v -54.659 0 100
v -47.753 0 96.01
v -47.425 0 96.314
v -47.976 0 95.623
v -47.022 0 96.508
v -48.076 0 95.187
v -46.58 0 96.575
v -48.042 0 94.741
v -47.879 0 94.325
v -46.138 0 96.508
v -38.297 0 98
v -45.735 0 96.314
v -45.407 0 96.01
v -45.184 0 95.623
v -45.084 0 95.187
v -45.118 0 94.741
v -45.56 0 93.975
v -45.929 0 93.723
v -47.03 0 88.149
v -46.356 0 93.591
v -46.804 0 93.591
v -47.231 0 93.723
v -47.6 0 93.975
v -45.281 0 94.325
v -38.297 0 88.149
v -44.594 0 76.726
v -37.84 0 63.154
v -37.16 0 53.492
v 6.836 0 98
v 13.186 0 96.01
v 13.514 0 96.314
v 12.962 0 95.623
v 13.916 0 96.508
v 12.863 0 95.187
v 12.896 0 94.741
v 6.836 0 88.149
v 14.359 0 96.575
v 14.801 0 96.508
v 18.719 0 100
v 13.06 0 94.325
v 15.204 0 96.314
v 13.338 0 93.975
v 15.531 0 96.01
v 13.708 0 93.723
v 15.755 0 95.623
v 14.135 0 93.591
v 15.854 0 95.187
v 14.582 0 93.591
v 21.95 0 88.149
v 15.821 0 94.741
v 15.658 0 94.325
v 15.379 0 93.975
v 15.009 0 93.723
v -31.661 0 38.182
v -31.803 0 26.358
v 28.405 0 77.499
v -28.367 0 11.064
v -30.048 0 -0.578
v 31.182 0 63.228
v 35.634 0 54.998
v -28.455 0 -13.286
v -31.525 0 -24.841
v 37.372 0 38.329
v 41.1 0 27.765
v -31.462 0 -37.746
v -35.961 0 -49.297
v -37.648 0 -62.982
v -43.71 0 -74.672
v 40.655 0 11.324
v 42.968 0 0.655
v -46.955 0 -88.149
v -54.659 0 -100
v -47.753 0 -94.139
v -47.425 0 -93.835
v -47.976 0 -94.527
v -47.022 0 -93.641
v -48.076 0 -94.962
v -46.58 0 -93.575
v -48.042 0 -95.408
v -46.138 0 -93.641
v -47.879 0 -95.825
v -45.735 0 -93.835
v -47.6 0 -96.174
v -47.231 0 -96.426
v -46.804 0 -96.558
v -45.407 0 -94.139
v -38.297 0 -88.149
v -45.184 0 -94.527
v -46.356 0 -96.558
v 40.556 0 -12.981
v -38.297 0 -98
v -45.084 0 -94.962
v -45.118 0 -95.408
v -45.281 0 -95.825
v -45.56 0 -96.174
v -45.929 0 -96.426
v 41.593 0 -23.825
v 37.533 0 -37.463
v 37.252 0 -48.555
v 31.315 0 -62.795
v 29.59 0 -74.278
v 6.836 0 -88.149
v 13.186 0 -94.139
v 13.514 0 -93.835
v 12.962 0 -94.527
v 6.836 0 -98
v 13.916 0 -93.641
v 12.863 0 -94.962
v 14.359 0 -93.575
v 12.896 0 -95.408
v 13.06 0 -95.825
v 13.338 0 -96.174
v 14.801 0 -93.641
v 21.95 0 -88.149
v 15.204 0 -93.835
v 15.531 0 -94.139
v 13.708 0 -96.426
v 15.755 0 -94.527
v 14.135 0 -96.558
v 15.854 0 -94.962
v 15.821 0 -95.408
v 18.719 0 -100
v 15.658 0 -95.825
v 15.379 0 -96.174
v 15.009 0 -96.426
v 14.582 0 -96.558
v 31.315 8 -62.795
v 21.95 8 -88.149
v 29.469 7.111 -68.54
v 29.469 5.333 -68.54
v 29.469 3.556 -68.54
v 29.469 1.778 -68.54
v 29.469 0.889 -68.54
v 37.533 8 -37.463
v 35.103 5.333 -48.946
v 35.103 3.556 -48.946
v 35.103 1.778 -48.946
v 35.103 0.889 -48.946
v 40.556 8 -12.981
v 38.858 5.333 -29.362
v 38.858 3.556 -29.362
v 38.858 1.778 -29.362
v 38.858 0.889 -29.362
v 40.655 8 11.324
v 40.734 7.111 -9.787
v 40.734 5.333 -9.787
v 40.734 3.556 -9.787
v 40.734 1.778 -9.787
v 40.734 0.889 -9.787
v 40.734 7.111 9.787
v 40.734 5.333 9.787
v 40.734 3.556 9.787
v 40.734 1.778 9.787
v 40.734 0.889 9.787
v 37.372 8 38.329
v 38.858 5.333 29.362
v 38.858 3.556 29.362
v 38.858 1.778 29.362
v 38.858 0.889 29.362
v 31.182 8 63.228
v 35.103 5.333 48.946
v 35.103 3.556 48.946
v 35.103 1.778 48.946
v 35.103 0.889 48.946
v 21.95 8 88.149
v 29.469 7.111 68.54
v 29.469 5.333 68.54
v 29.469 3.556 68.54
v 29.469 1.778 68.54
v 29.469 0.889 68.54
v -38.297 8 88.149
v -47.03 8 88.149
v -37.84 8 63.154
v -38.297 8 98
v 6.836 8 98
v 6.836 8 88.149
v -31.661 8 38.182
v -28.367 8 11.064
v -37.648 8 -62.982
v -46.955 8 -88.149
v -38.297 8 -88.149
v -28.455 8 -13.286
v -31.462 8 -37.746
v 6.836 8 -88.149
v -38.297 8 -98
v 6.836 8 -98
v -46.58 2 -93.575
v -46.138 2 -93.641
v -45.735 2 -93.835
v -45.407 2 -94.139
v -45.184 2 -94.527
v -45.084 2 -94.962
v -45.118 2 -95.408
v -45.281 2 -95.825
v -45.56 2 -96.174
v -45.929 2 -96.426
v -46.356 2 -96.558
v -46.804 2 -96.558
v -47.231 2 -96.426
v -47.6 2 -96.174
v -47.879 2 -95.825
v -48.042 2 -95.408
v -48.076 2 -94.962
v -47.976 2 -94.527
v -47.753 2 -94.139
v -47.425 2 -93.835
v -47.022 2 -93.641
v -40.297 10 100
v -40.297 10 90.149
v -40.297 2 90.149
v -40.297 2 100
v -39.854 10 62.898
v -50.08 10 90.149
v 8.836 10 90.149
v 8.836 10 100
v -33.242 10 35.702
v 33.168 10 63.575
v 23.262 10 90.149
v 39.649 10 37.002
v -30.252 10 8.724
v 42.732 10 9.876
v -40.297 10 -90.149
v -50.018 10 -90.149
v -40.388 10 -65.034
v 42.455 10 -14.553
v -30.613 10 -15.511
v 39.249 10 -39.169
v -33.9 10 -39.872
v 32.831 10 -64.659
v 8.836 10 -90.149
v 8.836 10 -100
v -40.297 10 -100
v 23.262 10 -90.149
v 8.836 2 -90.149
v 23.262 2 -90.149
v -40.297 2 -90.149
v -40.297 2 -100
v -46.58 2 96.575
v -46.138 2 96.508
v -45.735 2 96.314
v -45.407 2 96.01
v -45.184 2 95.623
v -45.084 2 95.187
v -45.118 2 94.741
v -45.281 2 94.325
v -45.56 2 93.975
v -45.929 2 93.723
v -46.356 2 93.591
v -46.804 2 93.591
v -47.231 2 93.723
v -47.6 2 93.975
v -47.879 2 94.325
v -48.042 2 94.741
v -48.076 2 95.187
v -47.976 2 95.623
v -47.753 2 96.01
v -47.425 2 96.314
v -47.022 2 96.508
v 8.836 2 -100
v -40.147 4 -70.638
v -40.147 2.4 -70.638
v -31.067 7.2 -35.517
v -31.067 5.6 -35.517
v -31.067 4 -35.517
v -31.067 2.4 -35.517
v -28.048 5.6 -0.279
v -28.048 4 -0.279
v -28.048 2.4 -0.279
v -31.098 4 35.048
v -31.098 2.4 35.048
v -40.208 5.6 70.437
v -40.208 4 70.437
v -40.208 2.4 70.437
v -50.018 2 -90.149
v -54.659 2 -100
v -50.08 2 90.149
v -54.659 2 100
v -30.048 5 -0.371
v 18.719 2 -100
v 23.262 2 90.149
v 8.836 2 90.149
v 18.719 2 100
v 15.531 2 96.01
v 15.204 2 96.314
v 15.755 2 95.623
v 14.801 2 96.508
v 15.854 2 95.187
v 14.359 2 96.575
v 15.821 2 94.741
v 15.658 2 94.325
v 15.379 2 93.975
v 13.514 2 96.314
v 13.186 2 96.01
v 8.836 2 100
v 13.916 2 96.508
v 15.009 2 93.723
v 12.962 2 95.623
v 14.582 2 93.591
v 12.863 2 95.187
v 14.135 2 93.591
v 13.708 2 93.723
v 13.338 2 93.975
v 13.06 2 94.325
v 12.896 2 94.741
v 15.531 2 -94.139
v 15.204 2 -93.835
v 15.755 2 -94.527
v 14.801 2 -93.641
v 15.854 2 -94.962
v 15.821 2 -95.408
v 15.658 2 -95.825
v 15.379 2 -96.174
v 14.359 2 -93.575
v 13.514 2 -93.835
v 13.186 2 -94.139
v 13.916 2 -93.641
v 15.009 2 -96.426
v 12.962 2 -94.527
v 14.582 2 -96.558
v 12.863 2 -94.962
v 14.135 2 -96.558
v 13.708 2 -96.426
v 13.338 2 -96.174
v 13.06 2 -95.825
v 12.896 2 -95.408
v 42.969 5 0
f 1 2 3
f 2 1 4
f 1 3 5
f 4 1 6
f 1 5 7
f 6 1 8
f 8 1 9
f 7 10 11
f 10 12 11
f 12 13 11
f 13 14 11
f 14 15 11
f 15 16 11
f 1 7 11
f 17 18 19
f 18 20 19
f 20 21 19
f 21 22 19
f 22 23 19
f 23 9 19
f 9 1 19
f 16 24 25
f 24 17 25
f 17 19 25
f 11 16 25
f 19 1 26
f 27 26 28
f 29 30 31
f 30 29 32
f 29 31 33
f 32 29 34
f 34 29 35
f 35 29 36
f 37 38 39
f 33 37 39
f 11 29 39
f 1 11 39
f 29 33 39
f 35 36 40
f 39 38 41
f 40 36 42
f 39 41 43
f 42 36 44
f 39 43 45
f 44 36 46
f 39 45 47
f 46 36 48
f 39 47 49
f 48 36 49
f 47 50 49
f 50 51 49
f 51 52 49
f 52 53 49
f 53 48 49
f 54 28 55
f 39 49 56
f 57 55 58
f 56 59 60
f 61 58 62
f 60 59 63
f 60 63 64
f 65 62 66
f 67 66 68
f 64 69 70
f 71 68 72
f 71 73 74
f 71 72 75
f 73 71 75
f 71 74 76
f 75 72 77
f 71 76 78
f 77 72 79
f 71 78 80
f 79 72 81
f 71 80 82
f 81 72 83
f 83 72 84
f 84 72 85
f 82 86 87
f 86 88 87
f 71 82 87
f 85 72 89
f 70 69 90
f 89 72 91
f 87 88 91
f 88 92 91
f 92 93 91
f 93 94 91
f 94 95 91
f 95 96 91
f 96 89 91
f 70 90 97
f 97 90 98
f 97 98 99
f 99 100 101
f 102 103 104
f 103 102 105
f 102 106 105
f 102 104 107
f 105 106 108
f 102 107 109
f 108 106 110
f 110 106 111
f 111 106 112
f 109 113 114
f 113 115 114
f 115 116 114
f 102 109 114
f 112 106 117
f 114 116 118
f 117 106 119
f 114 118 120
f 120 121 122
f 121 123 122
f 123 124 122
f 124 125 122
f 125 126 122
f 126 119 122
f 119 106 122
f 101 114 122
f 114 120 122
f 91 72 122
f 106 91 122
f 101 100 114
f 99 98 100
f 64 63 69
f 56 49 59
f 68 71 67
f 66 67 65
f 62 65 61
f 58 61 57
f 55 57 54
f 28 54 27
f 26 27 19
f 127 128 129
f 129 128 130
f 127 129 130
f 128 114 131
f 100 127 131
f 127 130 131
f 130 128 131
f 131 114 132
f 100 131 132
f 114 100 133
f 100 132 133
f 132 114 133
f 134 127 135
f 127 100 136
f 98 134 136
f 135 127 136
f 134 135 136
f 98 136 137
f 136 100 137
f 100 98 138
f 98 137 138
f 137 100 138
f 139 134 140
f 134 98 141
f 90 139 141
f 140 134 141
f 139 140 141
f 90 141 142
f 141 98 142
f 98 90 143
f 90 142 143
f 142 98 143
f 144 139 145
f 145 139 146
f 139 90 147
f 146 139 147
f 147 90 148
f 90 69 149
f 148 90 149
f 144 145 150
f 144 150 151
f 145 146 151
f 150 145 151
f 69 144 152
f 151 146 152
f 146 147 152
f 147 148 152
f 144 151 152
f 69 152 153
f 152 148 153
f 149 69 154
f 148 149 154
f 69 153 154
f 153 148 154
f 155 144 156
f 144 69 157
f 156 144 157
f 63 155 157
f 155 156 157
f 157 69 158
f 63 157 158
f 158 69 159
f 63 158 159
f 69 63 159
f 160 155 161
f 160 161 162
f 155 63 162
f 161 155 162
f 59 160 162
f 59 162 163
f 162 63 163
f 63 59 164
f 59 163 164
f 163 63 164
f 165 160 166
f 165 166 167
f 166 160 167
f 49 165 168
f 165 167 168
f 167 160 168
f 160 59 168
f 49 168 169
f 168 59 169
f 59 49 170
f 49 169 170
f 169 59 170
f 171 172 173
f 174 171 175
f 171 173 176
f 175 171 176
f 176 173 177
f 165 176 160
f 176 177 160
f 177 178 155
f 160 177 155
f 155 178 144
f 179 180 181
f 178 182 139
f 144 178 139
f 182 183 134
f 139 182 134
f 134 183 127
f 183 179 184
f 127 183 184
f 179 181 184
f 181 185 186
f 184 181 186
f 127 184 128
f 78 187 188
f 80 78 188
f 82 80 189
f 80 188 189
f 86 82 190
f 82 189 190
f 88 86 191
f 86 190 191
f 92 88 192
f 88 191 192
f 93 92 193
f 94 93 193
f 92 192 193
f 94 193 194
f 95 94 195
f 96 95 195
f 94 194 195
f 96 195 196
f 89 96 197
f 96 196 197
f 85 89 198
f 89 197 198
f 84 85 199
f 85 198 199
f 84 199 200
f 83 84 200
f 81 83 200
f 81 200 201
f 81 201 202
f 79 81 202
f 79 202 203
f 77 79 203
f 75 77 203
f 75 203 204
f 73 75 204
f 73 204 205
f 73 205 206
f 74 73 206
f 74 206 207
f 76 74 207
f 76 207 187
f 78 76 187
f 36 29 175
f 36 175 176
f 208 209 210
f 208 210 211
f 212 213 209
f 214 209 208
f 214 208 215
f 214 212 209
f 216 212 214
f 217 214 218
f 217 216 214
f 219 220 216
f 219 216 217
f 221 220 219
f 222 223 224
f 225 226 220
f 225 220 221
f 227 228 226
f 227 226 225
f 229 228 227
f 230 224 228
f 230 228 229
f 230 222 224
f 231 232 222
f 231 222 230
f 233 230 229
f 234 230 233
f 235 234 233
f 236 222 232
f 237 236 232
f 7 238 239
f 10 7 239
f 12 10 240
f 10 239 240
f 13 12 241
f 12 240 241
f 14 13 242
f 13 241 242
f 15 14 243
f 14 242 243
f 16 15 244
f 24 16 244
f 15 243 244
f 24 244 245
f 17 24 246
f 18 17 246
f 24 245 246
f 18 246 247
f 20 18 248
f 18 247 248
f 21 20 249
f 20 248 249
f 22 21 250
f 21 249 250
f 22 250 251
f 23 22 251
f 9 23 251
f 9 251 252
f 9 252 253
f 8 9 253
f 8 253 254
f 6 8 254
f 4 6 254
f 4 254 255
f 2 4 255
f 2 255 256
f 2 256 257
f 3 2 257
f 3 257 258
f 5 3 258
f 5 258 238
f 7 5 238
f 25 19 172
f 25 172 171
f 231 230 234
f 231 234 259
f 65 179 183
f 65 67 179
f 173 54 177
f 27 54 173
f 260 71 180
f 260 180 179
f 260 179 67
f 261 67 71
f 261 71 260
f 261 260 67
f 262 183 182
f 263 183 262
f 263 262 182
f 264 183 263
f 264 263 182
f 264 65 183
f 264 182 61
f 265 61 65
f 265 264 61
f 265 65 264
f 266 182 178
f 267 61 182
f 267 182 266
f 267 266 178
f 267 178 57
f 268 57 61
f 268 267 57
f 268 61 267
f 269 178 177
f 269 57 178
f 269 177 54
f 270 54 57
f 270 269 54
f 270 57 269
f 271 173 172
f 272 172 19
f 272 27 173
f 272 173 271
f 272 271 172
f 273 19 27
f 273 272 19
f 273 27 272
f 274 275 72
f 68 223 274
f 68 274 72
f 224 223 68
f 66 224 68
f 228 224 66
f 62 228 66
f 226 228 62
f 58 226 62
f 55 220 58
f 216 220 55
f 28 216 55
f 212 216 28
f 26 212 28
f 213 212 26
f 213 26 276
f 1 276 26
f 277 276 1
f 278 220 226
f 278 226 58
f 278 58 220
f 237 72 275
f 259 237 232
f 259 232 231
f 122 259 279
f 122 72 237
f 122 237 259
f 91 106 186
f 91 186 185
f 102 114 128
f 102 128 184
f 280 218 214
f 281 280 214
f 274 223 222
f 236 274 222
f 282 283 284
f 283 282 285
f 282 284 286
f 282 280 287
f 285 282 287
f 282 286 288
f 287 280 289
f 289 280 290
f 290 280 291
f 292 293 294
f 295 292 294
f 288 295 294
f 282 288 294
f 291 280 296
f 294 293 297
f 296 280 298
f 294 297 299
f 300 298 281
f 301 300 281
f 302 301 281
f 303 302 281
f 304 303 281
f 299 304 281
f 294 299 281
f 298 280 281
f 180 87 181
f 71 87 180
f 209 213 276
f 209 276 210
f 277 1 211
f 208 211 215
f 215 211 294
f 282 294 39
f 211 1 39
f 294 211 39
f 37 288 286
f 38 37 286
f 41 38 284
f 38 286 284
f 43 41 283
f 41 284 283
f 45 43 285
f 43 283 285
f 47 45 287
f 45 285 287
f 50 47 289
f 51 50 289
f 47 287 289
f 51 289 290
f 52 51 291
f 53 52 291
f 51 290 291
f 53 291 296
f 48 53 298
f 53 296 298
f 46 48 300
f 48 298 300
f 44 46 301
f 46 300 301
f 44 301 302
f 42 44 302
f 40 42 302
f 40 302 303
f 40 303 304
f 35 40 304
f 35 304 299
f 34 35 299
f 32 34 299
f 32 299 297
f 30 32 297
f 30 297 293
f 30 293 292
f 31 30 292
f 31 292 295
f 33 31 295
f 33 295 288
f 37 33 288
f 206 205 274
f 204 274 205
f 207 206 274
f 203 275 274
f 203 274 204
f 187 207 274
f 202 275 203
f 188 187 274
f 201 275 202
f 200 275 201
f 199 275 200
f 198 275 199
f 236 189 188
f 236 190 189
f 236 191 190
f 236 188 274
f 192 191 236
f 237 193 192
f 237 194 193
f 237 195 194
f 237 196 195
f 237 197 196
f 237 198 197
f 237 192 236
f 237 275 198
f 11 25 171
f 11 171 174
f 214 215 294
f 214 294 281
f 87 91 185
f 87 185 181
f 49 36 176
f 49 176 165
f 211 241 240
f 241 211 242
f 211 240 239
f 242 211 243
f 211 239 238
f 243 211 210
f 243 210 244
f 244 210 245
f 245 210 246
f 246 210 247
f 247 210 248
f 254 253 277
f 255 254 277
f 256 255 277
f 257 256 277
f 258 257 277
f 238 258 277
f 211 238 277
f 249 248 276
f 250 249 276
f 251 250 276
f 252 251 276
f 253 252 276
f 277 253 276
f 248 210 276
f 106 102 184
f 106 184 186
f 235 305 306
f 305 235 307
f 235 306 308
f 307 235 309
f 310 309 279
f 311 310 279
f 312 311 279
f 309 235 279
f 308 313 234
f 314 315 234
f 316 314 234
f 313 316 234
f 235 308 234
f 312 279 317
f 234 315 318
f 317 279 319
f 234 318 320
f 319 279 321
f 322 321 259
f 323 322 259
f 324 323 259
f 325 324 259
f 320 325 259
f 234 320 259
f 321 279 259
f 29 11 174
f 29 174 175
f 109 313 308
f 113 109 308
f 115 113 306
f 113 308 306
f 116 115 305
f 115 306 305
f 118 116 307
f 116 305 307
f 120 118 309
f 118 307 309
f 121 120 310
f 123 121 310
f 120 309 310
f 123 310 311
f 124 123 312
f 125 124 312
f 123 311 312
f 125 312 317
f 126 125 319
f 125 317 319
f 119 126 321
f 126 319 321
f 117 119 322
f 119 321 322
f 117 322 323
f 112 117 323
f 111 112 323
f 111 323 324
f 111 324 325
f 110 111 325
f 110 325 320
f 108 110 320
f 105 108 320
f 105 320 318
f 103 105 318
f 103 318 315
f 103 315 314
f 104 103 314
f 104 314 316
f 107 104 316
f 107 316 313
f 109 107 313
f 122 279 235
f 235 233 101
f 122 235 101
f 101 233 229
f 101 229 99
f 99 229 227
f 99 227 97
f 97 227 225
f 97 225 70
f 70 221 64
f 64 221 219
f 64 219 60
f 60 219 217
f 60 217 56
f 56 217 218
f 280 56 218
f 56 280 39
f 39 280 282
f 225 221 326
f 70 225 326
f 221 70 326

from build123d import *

# Parameters (mm, degrees)
CROQUIS1_W              = 200
CROQUIS1_H              = 200
SALIENTE_EXTRUIR1_DEPTH = 10
CORTAR_EXTRUIR2_DEPTH   = 10
CORTAR_EXTRUIR3_DEPTH   = 8
CROQUIS6_R              = 1.5
CORTAR_EXTRUIR4_DEPTH   = 32
VACIADO1_DEPTH          = 8


# Read off the part's stored shape, not the designer's step: Vaciado1
with BuildPart() as part:
    # Croquis1 → Saliente-Extruir1 (new body)
    with BuildSketch(Plane(origin=(0, 0, 0), x_dir=(1, 0, 0), z_dir=(0, 1, 0))):
        Rectangle(CROQUIS1_W, CROQUIS1_H)
    extrude(amount=SALIENTE_EXTRUIR1_DEPTH)

    # Croquis3 → Cortar-Extruir2 (cut)
    with BuildSketch(Plane(origin=(0, 10, 0), x_dir=(1, 0, 0), z_dir=(0, 1, 0))):
        with BuildLine():
            add(Edge.make_bspline(
                [(-54.658905902, 100), (-5.437672215, 0.742753657), (-54.658905902, -100)],
                knots=[0, 0, 0, 1, 1, 1], degree=2))
            Line((-54.658905902, 100), (-100, 100))
            Line((-100, 100), (-100, -100))
            Line((-100, -100), (-54.658905902, -100))
        make_face()
        with BuildLine():
            Line((100, 100), (18.719386755, 100))
            add(Edge.make_bspline(
                [(18.719386755, 100), (67.218637457, 0), (18.719386755, -100)],
                knots=[0, 0, 0, 1, 1, 1], degree=2))
            Line((18.719386755, -100), (100, -100))
            Line((100, -100), (100, 100))
        make_face()
    extrude(amount=-CORTAR_EXTRUIR2_DEPTH, mode=Mode.SUBTRACT)

    # Croquis4 → Cortar-Extruir3 (cut)
    with BuildSketch(Plane(origin=(0, 10, 0), x_dir=(1, 0, 0), z_dir=(0, 1, 0))):
        Polygon((-50.296578731, -90.149033959), (-40.296578731, -90.149033959), (-40.296578731, -100.149033959), (-50.296578731, -100.149033959), (-58.120283929, -100.149033959), align=None)
        Polygon((8.836094338, -90.149033959), (18.836094338, -90.149033959), (23.704036403, -90.149033959), (18.836094338, -100.149033959), (8.836094338, -100.149033959), align=None)
        Polygon((8.836094338, 90.149033959), (8.836094338, 100.149033959), (18.836094338, 100.149033959), (23.704036403, 90.149033959), (18.836094338, 90.149033959), align=None)
        Polygon((-58.120283929, 100.149033959), (-50.296578731, 90.149033959), (-40.296578731, 90.149033959), (-40.296578731, 100.149033959), (-50.296578731, 100.149033959), align=None)
    extrude(amount=-CORTAR_EXTRUIR3_DEPTH, mode=Mode.SUBTRACT)

    # Croquis6 → Cortar-Extruir4 (cut)
    with BuildSketch(Plane(origin=(0, 2, 0), x_dir=(1, 0, 0), z_dir=(0, 1, 0))):
        with Locations(Location((-46.580021795, -95.07451698, 0), (0, 0, 270))):
            Circle(CROQUIS6_R)
        with Locations(Location((14.358607989, -95.07451698, 0), (0, 0, 270))):
            Circle(CROQUIS6_R)
        with Locations(Location((14.358607989, 95.07451698, 0), (0, 0, 270))):
            Circle(CROQUIS6_R)
        with Locations(Location((-46.580021795, 95.07451698, 0), (0, 0, 270))):
            Circle(CROQUIS6_R)
    extrude(amount=-CORTAR_EXTRUIR4_DEPTH, mode=Mode.SUBTRACT)

    # Vaciado1 outline → Vaciado1 (cut)
    with BuildSketch(Plane(origin=(0, 0, 0), x_dir=(1, 0, 0), z_dir=(0, 1, 0))):
        with BuildLine():
            Line((-38.296578731, 88.149033959), (-46.954714444, 88.14903419))
            add(Edge.make_bspline(
                [(-46.954714444, 88.14903419), (-39.391707249, 70.655852329), (-33.505222898, 53.123612665), (-29.298629275, 35.553220346), (-26.77560099, 17.947129894), (-25.939405083, 0.309621467), (-26.791931975, -17.352344743), (-29.330747185, -35.032202144), (-33.552462911, -52.726080621), (-39.453418895, -70.431901676), (-47.030358691, -88.149034179)],
                knots=[0.063666004, 0.063666004, 0.063666004, 0.063666004, 0.063666004, 0.063666004, 0.063666004, 0.063666004, 0.063666004, 0.063666004, 0.063666004, 0.937249877, 0.937249877, 0.937249877, 0.937249877, 0.937249877, 0.937249877, 0.937249877, 0.937249877, 0.937249877, 0.937249877, 0.937249877], degree=10))
            Line((-47.030358691, -88.149034179), (-38.296578731, -88.149033959))
            Line((-38.296578731, -88.149033959), (-38.296578731, -98))
            Line((-38.296578731, -98), (6.836094338, -98))
            Line((6.836094338, -98), (6.836094338, -88.149033959))
            Line((6.836094338, -88.149033959), (21.949825856, -88.149033757))
            add(Edge.make_bspline(
                [(21.949825856, 88.149033757), (30.411471368, 68.532743192), (36.750179646, 48.933917862), (40.970725224, 29.351479613), (43.07830794, 9.781812592), (43.07830794, -9.781812592), (40.970725224, -29.351479613), (36.750179646, -48.933917862), (30.411471368, -68.532743192), (21.949825856, -88.149033757)],
                knots=[0.055294031, 0.055294031, 0.055294031, 0.055294031, 0.055294031, 0.055294031, 0.055294031, 0.055294031, 0.055294031, 0.055294031, 0.944705969, 0.944705969, 0.944705969, 0.944705969, 0.944705969, 0.944705969, 0.944705969, 0.944705969, 0.944705969, 0.944705969], degree=9))
            Line((21.949825856, 88.149033757), (6.836094338, 88.149033959))
            Line((6.836094338, 88.149033959), (6.836094338, 98))
            Line((6.836094338, 98), (-38.296578731, 98))
            Line((-38.296578731, 98), (-38.296578731, 88.149033959))
        make_face()
    extrude(amount=VACIADO1_DEPTH, mode=Mode.SUBTRACT)


solid = part.part
